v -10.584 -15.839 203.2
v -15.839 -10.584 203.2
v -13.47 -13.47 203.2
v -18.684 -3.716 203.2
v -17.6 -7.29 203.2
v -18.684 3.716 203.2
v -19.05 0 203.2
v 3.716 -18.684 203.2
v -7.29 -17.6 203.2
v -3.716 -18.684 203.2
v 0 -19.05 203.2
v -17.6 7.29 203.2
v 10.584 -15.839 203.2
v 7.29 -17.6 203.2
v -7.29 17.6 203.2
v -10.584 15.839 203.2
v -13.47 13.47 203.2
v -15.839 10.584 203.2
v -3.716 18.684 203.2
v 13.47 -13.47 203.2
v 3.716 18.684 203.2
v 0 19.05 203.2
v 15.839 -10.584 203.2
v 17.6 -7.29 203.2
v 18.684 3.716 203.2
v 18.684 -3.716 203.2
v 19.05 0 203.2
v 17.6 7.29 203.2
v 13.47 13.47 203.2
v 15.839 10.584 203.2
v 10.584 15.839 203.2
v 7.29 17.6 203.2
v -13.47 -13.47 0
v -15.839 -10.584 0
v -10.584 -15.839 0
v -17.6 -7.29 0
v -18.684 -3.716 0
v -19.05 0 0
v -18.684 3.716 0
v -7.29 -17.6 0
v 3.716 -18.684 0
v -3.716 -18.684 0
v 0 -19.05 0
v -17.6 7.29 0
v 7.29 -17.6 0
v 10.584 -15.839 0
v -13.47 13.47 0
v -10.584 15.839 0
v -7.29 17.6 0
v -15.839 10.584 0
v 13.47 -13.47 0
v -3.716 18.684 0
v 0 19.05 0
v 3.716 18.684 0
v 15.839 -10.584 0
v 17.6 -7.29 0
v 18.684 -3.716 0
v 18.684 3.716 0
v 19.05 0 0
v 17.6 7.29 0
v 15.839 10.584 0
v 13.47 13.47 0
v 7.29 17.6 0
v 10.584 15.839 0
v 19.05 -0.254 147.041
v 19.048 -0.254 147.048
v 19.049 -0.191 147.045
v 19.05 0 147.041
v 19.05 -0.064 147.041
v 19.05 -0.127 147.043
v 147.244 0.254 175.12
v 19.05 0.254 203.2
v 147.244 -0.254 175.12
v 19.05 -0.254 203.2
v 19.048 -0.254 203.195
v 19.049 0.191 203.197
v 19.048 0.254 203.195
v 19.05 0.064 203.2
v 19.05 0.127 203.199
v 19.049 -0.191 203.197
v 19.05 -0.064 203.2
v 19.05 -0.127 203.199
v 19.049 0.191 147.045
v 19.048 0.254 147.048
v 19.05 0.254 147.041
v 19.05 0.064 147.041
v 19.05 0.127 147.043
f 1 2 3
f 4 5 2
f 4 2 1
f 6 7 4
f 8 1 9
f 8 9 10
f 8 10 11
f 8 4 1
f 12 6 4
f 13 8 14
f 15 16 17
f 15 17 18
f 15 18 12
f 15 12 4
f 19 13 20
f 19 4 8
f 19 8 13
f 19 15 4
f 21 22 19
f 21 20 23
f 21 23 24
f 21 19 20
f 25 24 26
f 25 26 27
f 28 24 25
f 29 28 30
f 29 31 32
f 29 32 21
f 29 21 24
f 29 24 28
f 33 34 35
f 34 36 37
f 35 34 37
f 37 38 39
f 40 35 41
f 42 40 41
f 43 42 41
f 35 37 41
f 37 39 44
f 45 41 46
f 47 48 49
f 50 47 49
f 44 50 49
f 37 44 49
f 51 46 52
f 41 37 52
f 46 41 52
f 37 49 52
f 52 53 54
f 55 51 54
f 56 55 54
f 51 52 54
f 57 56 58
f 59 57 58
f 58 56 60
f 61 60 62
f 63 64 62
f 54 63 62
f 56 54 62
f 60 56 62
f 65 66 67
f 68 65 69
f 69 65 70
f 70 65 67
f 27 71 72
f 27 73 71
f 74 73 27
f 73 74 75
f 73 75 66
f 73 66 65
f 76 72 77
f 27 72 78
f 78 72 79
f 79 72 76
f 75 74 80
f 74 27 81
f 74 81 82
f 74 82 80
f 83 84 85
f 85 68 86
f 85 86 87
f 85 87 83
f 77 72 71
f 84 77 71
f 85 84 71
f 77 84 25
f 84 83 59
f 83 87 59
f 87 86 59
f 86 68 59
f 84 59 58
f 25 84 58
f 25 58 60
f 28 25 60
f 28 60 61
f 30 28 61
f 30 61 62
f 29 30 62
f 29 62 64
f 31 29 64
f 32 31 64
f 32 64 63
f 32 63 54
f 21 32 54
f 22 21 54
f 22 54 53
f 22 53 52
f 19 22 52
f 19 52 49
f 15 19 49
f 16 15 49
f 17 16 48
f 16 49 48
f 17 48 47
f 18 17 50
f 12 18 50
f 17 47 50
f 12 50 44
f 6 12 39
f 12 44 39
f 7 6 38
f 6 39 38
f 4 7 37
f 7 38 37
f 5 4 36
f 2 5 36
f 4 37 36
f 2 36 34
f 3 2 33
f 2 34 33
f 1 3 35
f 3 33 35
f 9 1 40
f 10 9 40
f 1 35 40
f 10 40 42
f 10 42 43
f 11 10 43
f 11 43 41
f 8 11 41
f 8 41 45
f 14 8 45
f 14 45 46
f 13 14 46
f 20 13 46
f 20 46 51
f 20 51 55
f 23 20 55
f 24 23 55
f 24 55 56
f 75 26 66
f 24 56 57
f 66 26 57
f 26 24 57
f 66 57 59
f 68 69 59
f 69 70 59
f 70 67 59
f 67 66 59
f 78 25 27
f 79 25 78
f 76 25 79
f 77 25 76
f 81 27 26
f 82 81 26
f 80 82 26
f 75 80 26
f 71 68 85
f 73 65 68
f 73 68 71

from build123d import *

# Parameters (mm, degrees)
F0_R     = 19.05
F1_DEPTH = 203.2
F3_DEPTH = 0.254


with BuildPart() as f1:
    # F0 (on Top) → F1 (new body)
    with BuildSketch(Plane.XY):
        Circle(F0_R)
    extrude(amount=F1_DEPTH)

    # F2 (on Front) → F3 (join, symmetric)
    with BuildSketch(Plane.XZ):
        Polygon((147.2438126802, 175.1202940941), (19.05, 203.2), (19.05, 147.0405881882), align=None)
        Polygon((19.05, 147.0405881882), (19.05, 203.2), (11.7504512891, 180.8726638556), align=None)
    extrude(amount=F3_DEPTH, both=True)


solid = f1.part
